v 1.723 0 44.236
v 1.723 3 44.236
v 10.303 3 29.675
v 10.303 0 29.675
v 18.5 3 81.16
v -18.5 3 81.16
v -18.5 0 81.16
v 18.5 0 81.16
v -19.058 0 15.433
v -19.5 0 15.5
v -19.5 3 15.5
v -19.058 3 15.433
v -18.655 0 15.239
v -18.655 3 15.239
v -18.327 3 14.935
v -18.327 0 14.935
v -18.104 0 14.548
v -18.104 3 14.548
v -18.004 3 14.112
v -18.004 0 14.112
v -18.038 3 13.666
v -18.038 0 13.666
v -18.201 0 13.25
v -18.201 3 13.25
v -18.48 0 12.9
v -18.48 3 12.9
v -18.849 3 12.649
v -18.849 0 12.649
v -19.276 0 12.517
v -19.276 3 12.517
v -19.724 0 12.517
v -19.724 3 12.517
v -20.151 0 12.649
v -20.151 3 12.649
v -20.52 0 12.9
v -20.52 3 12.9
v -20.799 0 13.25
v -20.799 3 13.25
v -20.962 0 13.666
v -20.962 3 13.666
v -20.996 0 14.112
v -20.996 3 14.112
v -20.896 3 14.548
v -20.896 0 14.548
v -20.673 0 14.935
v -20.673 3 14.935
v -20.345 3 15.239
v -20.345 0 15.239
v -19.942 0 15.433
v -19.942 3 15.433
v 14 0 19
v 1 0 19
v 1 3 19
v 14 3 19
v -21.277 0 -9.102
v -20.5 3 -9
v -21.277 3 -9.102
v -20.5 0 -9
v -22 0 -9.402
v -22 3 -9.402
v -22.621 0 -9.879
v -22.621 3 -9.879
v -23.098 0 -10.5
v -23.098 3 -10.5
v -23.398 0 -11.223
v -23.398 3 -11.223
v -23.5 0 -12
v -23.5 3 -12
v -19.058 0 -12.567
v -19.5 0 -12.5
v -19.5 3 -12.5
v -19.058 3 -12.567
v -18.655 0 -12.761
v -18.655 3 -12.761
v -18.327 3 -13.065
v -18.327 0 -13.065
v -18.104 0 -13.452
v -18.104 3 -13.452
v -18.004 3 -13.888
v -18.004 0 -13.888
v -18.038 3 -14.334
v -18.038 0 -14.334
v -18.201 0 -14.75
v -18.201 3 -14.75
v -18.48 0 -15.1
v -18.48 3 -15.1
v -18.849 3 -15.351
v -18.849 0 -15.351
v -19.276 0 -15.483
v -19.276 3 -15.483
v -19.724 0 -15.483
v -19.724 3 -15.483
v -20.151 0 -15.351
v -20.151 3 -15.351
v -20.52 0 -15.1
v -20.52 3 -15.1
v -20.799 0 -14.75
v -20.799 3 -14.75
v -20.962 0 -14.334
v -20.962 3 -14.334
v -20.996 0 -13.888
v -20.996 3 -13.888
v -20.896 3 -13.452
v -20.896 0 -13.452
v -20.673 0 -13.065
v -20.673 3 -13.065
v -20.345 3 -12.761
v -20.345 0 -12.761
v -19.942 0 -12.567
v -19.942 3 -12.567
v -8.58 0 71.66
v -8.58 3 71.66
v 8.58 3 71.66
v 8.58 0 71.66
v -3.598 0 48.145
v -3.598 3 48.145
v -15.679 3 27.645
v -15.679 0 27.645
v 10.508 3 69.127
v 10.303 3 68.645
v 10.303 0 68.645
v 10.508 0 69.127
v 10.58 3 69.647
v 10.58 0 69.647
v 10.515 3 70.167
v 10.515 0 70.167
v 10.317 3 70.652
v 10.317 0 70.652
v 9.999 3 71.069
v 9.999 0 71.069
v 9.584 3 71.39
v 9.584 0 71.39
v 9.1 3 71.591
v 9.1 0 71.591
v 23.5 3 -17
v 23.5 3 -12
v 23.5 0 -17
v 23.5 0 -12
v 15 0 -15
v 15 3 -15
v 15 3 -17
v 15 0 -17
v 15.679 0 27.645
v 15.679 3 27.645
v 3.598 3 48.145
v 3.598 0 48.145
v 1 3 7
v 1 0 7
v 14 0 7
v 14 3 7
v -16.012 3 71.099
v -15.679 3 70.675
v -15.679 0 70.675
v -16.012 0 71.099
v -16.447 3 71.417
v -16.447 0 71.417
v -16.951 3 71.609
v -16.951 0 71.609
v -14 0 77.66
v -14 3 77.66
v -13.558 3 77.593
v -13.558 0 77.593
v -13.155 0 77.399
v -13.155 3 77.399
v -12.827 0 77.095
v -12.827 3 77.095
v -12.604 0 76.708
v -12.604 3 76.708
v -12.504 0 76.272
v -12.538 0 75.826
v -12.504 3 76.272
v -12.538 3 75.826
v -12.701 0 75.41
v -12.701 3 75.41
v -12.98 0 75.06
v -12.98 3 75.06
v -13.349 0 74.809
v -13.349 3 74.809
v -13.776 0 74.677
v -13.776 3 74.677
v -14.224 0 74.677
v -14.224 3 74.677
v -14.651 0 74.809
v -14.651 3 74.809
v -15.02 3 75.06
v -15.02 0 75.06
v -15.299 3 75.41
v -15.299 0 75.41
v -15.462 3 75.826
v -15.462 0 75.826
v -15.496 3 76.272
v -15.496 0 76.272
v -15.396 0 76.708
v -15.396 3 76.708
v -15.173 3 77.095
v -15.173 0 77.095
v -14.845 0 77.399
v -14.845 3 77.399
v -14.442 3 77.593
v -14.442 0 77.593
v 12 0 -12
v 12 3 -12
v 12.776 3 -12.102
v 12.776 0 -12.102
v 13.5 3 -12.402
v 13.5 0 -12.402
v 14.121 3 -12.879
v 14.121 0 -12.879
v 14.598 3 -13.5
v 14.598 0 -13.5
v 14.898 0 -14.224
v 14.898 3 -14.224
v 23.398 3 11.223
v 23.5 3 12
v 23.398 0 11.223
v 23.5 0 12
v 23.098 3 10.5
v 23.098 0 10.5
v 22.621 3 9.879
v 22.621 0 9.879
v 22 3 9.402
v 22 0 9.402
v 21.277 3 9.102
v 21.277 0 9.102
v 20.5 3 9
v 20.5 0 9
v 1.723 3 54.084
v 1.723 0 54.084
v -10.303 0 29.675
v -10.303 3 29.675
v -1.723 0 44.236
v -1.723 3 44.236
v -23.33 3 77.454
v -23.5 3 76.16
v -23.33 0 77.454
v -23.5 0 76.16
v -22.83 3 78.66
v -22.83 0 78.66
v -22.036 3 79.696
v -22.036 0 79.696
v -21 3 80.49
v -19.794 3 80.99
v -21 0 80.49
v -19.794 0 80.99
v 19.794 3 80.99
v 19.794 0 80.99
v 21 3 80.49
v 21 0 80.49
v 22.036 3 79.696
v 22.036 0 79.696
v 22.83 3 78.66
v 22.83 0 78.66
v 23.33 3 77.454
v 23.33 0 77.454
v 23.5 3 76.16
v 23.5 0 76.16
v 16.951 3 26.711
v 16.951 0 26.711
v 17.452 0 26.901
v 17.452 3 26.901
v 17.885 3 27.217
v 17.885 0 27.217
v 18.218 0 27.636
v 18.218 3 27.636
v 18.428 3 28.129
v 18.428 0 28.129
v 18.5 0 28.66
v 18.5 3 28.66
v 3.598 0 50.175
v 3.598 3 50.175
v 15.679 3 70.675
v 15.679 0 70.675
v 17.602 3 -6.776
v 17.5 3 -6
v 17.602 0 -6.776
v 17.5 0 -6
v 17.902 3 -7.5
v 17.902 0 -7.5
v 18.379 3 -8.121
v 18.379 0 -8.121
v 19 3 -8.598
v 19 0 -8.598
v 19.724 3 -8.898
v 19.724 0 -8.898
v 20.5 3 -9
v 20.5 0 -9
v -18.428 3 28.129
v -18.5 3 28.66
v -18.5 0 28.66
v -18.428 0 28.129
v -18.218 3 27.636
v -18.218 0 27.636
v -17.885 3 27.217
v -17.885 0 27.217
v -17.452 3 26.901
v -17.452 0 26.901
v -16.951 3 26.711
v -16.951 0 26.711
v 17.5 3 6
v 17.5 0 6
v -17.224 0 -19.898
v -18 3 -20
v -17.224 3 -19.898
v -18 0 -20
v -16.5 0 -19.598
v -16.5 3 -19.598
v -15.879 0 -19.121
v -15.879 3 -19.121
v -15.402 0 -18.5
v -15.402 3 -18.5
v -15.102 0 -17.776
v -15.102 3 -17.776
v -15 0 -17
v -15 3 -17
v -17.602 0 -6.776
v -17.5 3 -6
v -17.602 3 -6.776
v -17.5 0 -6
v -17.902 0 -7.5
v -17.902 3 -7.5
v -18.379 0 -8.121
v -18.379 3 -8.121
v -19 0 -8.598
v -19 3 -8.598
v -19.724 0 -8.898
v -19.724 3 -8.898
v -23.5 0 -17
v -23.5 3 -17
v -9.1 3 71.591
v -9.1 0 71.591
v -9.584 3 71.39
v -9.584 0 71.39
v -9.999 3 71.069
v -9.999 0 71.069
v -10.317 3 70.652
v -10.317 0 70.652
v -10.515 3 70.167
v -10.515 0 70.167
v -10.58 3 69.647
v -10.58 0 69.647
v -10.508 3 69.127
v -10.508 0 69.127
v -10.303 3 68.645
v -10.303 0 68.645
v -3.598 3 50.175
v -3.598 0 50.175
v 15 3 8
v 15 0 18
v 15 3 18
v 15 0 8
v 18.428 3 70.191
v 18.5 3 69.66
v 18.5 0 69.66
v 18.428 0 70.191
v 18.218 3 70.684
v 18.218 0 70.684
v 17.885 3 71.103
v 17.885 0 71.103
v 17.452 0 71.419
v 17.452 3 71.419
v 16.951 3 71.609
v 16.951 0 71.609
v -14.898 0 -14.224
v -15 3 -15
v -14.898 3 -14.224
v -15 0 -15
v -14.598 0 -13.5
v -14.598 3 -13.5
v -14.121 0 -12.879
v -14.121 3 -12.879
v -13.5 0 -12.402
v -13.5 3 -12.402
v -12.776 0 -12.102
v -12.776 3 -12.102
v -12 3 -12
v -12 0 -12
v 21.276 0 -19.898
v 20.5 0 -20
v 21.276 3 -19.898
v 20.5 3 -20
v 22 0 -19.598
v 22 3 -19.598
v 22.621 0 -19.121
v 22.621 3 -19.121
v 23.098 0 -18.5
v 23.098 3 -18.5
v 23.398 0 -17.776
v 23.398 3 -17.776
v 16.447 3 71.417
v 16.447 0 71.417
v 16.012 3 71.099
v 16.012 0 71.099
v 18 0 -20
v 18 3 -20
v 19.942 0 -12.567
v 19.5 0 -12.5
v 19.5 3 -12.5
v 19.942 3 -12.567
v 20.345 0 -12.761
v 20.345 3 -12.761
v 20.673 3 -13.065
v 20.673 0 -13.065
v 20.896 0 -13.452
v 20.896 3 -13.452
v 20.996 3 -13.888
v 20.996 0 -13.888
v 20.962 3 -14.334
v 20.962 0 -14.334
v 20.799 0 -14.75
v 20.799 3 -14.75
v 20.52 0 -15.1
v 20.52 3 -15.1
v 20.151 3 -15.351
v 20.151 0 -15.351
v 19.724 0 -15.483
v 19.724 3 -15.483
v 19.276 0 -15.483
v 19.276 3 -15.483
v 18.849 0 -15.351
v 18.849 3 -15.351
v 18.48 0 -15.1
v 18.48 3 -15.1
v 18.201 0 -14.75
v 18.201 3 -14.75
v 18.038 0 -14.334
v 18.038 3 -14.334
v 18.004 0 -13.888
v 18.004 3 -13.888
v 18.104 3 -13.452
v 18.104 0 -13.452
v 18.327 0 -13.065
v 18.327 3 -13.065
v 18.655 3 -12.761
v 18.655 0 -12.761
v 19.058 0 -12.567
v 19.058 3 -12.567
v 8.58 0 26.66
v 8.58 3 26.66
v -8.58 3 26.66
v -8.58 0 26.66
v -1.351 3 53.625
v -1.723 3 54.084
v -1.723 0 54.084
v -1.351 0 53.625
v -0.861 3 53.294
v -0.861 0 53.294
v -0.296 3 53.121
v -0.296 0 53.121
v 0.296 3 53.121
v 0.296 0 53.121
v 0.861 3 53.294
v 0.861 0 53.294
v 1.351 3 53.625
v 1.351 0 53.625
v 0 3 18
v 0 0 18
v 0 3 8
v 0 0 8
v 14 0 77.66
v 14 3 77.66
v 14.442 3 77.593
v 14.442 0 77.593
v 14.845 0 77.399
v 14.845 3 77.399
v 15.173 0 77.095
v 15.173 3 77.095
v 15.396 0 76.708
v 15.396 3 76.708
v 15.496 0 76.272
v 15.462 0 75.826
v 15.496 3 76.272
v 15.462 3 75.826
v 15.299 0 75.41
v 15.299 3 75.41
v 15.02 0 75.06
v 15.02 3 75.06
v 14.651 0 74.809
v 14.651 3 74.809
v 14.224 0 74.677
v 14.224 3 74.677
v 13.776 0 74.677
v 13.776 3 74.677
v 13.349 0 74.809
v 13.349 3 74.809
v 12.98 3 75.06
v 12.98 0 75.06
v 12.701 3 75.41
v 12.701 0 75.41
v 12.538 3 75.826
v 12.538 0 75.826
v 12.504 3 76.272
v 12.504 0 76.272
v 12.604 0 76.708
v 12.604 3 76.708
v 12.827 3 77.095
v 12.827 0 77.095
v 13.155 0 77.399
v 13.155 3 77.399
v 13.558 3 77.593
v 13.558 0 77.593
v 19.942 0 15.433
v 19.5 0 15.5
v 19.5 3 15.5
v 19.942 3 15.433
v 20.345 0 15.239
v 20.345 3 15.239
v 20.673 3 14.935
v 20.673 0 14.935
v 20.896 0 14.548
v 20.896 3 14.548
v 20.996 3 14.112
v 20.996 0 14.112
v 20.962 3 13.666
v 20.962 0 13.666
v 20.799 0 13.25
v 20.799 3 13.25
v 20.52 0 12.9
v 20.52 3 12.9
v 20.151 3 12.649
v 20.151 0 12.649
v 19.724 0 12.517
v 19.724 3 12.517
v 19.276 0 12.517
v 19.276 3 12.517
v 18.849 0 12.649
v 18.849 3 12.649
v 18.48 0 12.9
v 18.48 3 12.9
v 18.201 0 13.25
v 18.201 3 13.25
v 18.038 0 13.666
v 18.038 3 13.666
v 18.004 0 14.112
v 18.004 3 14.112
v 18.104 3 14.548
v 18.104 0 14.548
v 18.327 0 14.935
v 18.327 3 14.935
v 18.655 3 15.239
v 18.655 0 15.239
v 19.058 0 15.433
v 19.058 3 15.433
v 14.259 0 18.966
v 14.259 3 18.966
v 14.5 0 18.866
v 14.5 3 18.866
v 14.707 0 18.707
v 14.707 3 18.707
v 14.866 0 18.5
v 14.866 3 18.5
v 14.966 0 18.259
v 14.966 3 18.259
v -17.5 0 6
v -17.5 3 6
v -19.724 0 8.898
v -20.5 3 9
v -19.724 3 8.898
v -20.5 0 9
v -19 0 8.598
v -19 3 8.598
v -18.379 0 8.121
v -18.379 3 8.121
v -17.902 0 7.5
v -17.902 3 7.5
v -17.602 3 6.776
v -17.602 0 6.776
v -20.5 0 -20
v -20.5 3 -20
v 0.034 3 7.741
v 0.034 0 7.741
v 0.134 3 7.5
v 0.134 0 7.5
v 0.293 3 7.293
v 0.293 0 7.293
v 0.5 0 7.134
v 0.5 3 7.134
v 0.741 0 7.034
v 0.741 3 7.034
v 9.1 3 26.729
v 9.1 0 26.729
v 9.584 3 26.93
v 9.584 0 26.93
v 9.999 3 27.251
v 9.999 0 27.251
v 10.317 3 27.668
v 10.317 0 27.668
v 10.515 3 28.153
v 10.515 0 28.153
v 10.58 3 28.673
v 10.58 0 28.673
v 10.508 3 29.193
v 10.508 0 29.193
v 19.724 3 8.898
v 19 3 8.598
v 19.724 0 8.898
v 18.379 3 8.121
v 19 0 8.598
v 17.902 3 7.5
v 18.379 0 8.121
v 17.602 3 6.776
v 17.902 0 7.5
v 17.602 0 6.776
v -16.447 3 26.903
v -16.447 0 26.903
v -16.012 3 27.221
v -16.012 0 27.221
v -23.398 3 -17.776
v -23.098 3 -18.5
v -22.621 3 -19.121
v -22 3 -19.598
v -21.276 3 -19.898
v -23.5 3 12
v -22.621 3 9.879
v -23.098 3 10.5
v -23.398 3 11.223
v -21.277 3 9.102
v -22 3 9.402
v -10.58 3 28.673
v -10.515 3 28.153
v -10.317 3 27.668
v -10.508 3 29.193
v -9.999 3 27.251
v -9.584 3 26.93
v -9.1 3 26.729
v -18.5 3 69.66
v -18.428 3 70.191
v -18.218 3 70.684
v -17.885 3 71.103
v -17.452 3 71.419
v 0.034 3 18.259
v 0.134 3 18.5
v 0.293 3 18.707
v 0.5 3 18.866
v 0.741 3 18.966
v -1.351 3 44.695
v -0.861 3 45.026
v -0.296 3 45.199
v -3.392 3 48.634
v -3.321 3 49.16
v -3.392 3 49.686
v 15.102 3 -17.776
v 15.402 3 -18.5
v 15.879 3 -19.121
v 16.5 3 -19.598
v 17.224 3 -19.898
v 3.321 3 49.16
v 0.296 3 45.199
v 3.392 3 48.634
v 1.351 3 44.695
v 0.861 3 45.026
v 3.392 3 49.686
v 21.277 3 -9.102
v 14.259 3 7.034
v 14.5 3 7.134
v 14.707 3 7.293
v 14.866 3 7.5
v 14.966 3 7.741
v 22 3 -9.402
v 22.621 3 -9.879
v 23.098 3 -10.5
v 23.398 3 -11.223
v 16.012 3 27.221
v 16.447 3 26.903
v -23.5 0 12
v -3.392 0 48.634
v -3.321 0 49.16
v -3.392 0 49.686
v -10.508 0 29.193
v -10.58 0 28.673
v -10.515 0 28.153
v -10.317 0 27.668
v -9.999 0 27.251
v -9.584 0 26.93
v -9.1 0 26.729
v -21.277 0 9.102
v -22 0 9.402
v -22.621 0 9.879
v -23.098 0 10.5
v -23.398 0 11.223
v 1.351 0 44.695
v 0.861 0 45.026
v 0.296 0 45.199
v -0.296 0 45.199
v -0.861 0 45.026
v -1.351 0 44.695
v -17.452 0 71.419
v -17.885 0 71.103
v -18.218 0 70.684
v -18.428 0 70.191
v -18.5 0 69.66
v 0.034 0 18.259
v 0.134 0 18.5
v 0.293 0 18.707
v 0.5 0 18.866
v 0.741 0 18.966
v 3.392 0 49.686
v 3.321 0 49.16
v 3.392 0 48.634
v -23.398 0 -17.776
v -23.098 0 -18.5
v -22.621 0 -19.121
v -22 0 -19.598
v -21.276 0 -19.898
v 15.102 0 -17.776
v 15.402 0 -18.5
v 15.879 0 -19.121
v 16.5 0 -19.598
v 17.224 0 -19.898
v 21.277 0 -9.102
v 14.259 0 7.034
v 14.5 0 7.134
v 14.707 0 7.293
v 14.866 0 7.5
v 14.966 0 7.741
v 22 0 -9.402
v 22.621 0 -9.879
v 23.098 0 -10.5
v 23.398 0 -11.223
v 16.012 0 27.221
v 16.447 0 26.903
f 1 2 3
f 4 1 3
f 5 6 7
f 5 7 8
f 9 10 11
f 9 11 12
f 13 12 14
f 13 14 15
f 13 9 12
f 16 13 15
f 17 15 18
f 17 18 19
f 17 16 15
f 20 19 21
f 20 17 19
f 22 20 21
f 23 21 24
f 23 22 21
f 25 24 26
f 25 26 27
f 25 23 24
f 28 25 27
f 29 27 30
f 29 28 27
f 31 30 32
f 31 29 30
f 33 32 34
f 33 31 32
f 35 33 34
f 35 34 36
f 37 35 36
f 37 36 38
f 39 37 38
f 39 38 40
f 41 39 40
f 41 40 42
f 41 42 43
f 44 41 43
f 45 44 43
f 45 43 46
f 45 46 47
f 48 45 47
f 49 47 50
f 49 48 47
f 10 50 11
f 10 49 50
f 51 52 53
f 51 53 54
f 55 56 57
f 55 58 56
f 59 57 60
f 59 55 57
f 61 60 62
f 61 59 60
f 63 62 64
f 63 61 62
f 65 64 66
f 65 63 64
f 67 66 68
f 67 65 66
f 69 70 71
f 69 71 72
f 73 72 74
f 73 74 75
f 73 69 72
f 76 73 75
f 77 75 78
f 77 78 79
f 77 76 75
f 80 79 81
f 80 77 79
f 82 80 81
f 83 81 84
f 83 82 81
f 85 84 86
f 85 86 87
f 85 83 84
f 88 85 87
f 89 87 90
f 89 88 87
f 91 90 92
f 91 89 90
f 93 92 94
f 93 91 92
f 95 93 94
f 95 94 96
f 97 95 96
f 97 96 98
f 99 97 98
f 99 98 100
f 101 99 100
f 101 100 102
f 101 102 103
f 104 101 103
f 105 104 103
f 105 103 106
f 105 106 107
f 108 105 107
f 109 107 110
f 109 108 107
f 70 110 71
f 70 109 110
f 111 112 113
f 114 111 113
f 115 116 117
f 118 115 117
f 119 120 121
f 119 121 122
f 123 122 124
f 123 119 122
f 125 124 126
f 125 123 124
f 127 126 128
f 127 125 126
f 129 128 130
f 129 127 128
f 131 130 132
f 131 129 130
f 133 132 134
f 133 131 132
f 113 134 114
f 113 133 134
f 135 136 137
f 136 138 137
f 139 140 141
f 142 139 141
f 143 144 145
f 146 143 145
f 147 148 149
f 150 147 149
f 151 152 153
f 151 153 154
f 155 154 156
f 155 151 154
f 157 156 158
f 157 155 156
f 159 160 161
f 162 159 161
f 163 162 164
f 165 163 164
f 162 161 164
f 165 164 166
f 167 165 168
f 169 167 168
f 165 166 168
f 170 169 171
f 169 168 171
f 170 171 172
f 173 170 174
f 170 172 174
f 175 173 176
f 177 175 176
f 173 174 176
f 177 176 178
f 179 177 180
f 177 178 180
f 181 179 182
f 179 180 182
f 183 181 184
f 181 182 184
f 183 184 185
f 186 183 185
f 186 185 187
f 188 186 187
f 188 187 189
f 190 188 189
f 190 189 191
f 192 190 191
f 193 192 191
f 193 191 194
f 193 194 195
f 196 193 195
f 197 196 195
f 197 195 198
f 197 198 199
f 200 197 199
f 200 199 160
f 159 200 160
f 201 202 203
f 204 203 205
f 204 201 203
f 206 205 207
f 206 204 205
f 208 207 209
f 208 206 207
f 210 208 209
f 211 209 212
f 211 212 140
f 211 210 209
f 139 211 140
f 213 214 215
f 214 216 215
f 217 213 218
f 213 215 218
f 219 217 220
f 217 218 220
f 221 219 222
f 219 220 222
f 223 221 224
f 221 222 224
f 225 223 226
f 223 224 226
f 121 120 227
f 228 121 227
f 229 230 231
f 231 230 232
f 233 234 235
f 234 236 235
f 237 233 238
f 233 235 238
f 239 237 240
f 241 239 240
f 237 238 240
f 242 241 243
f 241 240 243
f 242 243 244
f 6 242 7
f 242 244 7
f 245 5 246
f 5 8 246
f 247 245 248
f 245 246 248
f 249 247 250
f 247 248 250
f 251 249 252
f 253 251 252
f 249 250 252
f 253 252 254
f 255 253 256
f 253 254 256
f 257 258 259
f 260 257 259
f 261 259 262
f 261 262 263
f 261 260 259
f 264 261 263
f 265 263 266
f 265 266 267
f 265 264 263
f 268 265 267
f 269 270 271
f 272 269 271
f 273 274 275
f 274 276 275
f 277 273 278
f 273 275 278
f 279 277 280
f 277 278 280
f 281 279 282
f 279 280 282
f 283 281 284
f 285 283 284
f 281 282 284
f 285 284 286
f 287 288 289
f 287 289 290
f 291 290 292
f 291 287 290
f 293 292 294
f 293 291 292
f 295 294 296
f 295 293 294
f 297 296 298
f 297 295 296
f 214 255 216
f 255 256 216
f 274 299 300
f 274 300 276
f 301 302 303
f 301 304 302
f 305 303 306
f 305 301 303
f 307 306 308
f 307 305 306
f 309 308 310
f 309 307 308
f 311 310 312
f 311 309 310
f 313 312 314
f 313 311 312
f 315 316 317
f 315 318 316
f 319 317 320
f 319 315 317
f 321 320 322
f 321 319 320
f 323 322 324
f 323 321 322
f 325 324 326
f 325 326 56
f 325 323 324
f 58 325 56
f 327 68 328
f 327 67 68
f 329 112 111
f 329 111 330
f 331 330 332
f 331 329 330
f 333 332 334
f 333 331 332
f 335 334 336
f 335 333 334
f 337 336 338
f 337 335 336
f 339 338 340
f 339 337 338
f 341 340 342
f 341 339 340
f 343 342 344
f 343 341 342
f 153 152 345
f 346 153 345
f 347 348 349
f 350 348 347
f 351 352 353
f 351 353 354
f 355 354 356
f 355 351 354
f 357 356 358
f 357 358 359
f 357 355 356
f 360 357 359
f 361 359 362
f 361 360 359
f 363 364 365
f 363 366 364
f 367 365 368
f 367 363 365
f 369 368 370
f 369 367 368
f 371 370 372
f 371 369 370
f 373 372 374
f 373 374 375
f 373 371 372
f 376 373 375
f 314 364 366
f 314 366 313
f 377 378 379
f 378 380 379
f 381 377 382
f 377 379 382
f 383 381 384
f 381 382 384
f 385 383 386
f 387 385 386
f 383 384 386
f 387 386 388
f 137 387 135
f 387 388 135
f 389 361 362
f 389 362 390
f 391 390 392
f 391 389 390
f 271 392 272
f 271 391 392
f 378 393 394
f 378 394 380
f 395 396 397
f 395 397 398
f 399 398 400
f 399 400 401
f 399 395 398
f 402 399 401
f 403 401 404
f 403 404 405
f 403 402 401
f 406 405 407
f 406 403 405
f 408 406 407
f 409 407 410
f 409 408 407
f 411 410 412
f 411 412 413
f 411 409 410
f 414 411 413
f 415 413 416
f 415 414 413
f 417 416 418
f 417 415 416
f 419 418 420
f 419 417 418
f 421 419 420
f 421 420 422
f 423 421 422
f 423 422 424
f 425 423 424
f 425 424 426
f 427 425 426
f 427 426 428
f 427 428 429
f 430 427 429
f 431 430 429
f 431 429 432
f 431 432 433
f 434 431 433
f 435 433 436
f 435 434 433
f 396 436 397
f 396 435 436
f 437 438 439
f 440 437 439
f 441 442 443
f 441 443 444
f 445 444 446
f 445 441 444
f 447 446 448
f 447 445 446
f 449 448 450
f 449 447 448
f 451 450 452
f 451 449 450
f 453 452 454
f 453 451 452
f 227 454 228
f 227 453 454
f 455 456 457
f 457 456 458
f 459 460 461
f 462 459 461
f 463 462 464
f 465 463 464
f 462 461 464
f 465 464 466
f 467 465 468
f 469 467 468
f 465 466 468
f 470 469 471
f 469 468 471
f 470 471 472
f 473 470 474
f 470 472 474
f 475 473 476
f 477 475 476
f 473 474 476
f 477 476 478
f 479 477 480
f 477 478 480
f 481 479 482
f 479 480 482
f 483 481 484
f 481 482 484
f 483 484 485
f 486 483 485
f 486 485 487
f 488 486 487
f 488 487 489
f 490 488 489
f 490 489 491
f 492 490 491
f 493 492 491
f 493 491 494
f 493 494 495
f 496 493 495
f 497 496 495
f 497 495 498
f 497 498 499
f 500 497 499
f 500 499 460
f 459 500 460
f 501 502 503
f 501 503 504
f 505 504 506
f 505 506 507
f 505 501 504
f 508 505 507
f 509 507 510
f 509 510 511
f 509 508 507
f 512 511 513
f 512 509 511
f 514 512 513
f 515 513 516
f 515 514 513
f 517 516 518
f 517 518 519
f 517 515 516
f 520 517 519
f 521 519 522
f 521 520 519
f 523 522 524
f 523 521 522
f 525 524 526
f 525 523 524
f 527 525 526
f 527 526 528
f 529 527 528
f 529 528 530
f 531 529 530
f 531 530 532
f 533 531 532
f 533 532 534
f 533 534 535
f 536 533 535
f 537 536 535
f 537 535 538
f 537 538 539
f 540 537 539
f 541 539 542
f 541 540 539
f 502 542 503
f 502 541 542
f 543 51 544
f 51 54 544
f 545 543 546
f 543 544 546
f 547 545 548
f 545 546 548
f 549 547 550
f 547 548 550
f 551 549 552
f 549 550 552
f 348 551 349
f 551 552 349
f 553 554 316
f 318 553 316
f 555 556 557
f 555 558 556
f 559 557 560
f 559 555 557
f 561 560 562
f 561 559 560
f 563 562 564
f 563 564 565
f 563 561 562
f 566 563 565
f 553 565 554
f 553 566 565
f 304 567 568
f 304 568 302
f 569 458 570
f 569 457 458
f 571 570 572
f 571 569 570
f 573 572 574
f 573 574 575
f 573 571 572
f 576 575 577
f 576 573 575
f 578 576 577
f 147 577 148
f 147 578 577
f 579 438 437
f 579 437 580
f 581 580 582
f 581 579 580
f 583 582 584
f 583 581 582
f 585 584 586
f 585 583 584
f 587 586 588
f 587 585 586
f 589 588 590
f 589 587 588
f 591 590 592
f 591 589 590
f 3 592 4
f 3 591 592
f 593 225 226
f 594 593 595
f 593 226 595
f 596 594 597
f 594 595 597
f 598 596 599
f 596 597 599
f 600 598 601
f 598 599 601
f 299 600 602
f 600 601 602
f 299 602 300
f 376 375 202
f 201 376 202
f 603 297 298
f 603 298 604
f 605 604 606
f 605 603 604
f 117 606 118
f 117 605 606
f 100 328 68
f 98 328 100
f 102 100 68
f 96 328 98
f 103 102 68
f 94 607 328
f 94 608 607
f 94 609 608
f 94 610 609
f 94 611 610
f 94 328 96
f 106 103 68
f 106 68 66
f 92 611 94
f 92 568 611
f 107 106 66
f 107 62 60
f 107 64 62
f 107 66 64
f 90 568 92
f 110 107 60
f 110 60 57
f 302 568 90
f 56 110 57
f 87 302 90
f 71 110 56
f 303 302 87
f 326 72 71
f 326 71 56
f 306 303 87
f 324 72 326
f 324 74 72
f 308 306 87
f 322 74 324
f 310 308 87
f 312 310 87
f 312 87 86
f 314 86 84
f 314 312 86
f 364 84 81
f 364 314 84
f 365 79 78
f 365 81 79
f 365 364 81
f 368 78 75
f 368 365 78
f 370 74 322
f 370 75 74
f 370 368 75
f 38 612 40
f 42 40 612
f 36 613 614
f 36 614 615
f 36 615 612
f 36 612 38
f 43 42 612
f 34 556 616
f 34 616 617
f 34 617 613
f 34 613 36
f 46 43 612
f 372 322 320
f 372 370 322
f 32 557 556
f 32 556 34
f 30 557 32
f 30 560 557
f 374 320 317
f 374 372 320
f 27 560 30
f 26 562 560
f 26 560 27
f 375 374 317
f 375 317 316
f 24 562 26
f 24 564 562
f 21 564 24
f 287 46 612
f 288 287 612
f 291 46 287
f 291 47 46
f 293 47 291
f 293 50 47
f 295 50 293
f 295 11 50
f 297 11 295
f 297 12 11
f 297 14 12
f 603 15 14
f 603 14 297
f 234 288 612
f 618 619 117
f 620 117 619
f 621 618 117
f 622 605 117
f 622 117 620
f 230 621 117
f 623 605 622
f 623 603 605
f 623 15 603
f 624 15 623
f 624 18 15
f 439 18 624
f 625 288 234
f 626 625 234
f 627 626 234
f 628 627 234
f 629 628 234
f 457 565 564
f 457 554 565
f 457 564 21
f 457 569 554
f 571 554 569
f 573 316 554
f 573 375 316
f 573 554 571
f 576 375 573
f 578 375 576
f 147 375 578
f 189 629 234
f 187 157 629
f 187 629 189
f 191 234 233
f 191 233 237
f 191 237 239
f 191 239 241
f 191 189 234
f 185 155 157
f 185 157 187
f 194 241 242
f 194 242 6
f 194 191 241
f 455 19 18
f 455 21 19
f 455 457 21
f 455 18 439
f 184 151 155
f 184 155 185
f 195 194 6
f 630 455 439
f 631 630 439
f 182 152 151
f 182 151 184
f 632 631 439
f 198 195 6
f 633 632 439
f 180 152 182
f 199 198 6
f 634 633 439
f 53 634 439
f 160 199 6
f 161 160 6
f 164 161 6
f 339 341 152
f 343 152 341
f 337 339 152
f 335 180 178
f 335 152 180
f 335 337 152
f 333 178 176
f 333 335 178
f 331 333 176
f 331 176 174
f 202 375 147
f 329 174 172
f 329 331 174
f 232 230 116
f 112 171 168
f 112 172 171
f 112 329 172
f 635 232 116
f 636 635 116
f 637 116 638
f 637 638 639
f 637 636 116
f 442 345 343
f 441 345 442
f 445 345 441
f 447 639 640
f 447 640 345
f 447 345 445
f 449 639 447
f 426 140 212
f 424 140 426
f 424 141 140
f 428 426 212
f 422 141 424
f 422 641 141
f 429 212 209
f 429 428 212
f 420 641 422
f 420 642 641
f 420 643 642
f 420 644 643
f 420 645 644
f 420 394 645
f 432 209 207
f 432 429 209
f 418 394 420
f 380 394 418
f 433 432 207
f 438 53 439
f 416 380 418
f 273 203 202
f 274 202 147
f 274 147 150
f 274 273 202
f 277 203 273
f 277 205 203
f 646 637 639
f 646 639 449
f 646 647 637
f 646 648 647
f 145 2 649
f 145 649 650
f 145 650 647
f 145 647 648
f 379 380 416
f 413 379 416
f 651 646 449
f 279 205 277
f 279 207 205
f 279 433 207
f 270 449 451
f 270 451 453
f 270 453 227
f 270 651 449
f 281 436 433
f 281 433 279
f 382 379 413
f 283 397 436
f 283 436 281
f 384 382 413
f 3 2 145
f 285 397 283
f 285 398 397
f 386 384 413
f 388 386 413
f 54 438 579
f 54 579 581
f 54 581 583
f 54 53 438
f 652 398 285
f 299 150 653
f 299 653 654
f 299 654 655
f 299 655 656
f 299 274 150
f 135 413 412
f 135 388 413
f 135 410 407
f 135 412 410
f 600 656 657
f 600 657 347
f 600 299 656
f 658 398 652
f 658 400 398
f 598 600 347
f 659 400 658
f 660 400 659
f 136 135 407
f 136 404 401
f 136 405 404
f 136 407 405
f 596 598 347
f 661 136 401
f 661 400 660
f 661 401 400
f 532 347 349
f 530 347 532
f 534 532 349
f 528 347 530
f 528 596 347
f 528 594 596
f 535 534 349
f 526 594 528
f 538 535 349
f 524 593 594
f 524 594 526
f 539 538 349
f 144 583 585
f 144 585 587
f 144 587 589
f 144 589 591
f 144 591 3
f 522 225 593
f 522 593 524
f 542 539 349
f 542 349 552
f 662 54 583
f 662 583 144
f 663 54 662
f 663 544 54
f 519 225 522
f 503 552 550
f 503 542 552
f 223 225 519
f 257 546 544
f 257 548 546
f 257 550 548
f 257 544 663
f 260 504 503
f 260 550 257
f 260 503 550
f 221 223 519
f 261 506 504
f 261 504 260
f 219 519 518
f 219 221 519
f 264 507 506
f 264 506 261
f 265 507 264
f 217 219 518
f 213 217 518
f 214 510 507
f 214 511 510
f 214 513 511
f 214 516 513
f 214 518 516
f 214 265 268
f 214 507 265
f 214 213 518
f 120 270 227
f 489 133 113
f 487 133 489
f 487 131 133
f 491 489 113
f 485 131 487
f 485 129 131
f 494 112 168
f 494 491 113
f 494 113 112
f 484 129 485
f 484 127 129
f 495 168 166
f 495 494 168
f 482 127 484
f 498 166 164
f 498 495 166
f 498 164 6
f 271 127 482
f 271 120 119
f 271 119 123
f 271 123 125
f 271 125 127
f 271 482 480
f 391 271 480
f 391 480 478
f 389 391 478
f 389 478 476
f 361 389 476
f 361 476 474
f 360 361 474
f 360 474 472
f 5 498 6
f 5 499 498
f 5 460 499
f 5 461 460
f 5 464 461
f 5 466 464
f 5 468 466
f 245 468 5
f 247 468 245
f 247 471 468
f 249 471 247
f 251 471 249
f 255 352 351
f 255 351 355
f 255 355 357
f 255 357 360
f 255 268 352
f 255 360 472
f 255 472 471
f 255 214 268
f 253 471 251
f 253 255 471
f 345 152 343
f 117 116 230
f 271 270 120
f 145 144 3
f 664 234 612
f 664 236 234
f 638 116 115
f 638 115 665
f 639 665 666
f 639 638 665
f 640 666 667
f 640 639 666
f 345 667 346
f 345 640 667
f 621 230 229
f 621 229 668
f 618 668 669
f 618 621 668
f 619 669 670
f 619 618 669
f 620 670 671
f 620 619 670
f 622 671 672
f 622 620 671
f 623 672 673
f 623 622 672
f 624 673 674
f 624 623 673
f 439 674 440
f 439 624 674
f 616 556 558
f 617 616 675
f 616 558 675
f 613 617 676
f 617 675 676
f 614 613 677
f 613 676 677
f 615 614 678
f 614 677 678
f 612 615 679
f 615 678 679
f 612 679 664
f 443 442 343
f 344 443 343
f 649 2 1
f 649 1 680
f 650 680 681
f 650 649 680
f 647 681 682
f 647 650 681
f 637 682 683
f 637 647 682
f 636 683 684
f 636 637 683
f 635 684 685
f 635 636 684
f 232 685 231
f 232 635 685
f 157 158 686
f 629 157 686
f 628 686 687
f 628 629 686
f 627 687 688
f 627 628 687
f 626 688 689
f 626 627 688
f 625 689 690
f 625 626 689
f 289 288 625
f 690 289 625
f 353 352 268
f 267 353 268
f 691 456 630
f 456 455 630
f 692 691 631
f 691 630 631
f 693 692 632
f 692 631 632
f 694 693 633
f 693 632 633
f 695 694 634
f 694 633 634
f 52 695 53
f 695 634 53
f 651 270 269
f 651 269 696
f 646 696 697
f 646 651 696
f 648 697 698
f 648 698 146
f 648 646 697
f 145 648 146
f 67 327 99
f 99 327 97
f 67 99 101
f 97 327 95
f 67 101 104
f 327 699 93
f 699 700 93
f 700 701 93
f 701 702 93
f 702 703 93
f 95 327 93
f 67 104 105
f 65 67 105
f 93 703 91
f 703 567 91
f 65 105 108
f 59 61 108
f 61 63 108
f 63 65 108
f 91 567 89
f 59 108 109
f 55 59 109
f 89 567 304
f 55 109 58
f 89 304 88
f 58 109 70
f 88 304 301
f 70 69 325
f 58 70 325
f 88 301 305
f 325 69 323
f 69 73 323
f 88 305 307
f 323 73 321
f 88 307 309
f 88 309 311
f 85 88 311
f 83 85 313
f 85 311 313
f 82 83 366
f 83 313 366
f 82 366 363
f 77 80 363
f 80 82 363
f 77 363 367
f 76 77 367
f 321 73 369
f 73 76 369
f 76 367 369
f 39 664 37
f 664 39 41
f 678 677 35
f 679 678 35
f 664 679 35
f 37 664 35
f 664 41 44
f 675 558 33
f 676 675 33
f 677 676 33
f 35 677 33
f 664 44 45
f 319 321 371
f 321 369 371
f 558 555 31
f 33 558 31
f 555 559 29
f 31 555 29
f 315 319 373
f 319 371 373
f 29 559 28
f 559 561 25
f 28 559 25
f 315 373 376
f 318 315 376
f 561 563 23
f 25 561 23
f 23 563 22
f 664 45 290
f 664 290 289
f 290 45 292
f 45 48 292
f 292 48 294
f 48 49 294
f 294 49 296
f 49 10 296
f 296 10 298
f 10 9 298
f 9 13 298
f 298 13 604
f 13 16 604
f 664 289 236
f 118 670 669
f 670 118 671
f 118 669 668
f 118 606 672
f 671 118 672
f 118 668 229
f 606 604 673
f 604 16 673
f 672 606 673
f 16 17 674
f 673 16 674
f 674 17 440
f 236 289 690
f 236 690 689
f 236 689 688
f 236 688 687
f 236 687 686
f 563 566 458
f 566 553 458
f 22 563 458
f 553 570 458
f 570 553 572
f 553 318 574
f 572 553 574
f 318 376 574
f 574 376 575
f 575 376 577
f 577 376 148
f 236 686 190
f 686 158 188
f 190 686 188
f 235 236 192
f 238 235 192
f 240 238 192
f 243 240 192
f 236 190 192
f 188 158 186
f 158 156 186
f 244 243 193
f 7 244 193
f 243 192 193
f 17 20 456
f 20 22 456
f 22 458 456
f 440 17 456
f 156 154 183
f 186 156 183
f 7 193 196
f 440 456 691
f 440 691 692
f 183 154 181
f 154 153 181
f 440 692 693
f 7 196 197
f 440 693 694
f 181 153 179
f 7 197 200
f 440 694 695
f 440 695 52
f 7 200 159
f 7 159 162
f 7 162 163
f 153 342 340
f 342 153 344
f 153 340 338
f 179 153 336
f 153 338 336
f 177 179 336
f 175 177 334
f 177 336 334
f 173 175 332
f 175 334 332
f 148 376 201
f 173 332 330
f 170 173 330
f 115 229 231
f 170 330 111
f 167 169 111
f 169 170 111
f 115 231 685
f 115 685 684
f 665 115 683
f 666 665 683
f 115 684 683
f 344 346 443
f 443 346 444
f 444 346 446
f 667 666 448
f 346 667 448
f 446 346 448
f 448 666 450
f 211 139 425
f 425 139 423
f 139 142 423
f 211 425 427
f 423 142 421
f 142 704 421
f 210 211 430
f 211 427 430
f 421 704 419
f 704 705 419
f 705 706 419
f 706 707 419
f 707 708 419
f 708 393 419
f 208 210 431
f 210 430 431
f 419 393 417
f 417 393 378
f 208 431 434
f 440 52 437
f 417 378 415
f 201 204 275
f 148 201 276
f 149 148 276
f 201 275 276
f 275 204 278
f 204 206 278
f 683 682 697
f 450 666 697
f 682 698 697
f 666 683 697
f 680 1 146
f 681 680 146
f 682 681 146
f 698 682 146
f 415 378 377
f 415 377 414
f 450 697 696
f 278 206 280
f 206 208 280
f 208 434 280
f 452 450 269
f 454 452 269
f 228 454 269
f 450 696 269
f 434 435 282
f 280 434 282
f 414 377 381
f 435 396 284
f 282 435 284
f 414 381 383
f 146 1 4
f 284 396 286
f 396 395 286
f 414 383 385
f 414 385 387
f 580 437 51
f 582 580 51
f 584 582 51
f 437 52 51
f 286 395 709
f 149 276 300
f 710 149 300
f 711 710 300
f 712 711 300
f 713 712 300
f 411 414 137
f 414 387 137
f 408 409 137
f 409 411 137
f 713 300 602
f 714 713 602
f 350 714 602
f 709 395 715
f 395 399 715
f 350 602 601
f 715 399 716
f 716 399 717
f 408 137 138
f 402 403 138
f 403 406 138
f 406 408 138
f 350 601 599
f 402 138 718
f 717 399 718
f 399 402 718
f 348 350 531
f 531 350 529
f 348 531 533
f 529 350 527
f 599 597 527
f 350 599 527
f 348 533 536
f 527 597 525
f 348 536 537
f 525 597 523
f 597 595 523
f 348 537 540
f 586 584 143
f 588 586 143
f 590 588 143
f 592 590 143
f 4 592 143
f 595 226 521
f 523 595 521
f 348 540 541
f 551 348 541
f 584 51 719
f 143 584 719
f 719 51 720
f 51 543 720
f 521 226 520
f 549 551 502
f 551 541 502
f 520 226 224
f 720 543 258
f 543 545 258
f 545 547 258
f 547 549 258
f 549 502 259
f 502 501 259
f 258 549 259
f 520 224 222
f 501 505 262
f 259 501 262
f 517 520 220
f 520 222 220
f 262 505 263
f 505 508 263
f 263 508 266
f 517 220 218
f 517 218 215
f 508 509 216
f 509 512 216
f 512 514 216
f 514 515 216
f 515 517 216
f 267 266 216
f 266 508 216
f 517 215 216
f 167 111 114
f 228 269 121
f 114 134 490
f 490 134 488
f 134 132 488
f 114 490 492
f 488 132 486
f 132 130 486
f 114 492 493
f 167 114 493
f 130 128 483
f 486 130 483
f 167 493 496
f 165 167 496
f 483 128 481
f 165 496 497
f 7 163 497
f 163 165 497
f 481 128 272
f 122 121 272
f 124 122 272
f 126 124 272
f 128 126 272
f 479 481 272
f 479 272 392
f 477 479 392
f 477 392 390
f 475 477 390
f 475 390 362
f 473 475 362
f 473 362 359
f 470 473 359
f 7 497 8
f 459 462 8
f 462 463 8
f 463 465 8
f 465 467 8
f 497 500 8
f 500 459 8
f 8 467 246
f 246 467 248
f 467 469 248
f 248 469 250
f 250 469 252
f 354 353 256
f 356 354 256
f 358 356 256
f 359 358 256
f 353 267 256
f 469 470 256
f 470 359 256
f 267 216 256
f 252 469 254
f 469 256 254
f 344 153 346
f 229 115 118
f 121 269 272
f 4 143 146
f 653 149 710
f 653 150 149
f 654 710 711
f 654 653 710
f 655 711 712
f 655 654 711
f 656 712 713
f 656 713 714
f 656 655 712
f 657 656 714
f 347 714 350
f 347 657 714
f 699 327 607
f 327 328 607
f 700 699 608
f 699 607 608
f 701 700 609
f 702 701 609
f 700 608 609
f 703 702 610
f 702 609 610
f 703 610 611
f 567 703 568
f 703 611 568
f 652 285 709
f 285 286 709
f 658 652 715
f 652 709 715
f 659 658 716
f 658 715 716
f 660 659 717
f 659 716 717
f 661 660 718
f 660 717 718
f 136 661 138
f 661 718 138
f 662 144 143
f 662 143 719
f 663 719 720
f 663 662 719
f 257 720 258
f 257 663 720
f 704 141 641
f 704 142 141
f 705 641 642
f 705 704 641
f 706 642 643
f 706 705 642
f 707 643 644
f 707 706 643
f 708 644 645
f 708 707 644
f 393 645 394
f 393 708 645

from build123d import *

# Parameters (mm, degrees)
SKETCH_1_W          = 47
SKETCH_1_H          = 40
SKETCH_1_R          = 1.5
SKETCH_1_W_2        = 30
SKETCH_1_H_2        = 12
SKETCH_1_H_3        = 66.16
SKETCH_1_W_3        = 15
EXTRUDE_1_DEPTH     = 3
SKETCH_4_R          = 1.5
SKETCH_4_W          = 47
SKETCH_4_H          = 5
CUT_EXTRUDE_2_DEPTH = 4
SKETCH_7_W          = 30
SKETCH_7_H          = 8
SKETCH_7_W_2        = 6
SKETCH_7_H_2        = 18
CUT_EXTRUDE_3_DEPTH = 10
FILLET_2_R          = 3
FILLET_3_R          = 1
CUT_EXTRUDE_4_DEPTH = 10
FILLET_4_R          = 2
FILLET_5_R          = 5
FILLET_6_R          = 3
FILLET_7_R          = 3


# Some blends are built 0.0001 mm under size
with BuildPart() as part:
    # 草图1 → 凸台-拉伸1 (new body)
    # profile 1 of 3: a face of its own
    with BuildSketch(Plane(origin=(0, 0, 0), x_dir=(1, 0, 0), z_dir=(0, 1, 0))):
        Rectangle(SKETCH_1_W, SKETCH_1_H)
        with Locations(Location((19.5, -14, 0), (0, 0, 270))):
            Circle(SKETCH_1_R, mode=Mode.SUBTRACT)
        with Locations(Location((19.5, 14, 0), (0, 0, 270))):
            Circle(SKETCH_1_R, mode=Mode.SUBTRACT)
        with Locations(Location((-19.5, -14, 0), (0, 0, 270))):
            Circle(SKETCH_1_R, mode=Mode.SUBTRACT)
        with Locations(Location((-19.5, 14, 0), (0, 0, 270))):
            Circle(SKETCH_1_R, mode=Mode.SUBTRACT)
        with Locations((0, -13)):
            Rectangle(SKETCH_1_W_2, SKETCH_1_H_2, mode=Mode.SUBTRACT)
    # profile 2 of 3: a face of its own
    with BuildSketch(Plane(origin=(0, 0, 0), x_dir=(1, 0, 0), z_dir=(0, 1, 0))):
        with Locations((0, -53.08)):
            Rectangle(SKETCH_1_W, SKETCH_1_H_3)
    # profile 3 of 3: a face of its own
    with BuildSketch(Plane(origin=(0, 0, 0), x_dir=(1, 0, 0), z_dir=(0, 1, 0))):
        with Locations((-7.5, -13)):
            Rectangle(SKETCH_1_W_3, SKETCH_1_H_2)
    extrude(amount=EXTRUDE_1_DEPTH)

    # 草图4 → 切除-拉伸2 (cut)
    with BuildSketch(Plane(origin=(0, 3, 0), x_dir=(1, 0, 0), z_dir=(0, 1, 0))):
        with Locations(Location((-14, -76.16, 0), (0, 0, 270))):
            Circle(SKETCH_4_R)
        with Locations(Location((14, -76.16, 0), (0, 0, 270))):
            Circle(SKETCH_4_R)
        with Locations((0, -83.66)):
            Rectangle(SKETCH_4_W, SKETCH_4_H)
    extrude(amount=-CUT_EXTRUDE_2_DEPTH, mode=Mode.SUBTRACT)

    # 草图7 → 切除-拉伸3 (cut)
    with BuildSketch(Plane(origin=(0, 3, 0), x_dir=(1, 0, 0), z_dir=(0, 1, 0))):
        with Locations((0, 16)):
            Rectangle(SKETCH_7_W, SKETCH_7_H)
        with Locations((20.5, 0)):
            Rectangle(SKETCH_7_W_2, SKETCH_7_H_2)
        with Locations((-20.5, 0)):
            Rectangle(SKETCH_7_W_2, SKETCH_7_H_2)
    extrude(amount=-CUT_EXTRUDE_3_DEPTH, mode=Mode.SUBTRACT)

    # 圆角2
    fillet_2_edges = [part.edges().sort_by_distance(p)[0] for p in [
        (-23.5, 1.5, -20),
        (23.5, 1.5, -20),
    ]]
    fillet(fillet_2_edges, radius=FILLET_2_R)

    # 圆角3
    fillet_3_edges = [part.edges().sort_by_distance(p)[0] for p in [
        (0, 1.5, 19),
        (15, 1.5, 19),
        (15, 1.5, 7),
        (0, 1.5, 7),
    ]]
    fillet(fillet_3_edges, radius=FILLET_3_R)

    # 草图9 → 切除-拉伸4 (cut)
    with BuildSketch(Plane(origin=(0, 3, 0), x_dir=(1, 0, 0), z_dir=(0, 1, 0))):
        Polygon((-3, -49.16), (-16.258928571, -26.66), (-18.5, -26.66), (-18.5, -71.66), (-16.258928571, -71.66), align=None)
        Polygon((0, -47.16), (12.080357143, -26.66), (-12.080357143, -26.66), align=None)
        Polygon((18.5, -26.66), (16.258928571, -26.66), (3, -49.16), (16.258928571, -71.66), (18.5, -71.66), align=None)
        Polygon((-12.080357143, -71.66), (12.080357143, -71.66), (0, -51.16), align=None)
    extrude(amount=-CUT_EXTRUDE_4_DEPTH, mode=Mode.SUBTRACT)

    # 圆角4
    # the kernel refuses this fillet: 2 mm, written as the material it adds along each edge
    with BuildSketch(Plane(origin=(16.258928571, 3, 71.66), x_dir=(-0.5076923076923154, 0, -0.8615384615384569), z_dir=(0, -1, 0)), Plane(origin=(16.258928571, 3, 26.66), x_dir=(1, 0, 0), z_dir=(0, -1, 0)), Plane(origin=(-16.258928571, 3, 71.66), x_dir=(-1, 0, 0), z_dir=(0, -1, 0)), Plane(origin=(-16.258928571, 3, 26.66), x_dir=(0.5076923076923154, 0, 0.8615384615384569), z_dir=(0, -1, 0))) as fillet_4_piece_1:
        with BuildLine():
            CenterArc((FILLET_4_R * 0.571428571429, FILLET_4_R), FILLET_4_R, 210.510237406, 59.489762594)
            Line((-FILLET_4_R * 0.29010989011, FILLET_4_R * 0.492307692308), (0, 0))
            Line((0, 0), (FILLET_4_R * 0.571428571429, 0))
        make_face()
    extrude(amount=3)
    with BuildSketch(Plane(origin=(3, 3, 49.16), x_dir=(0.5076923076923108, 0, -0.8615384615384596), z_dir=(0, -1, 0))) as fillet_4_piece_2:
        with BuildLine():
            CenterArc((FILLET_4_R * 0.589285714286, FILLET_4_R), FILLET_4_R, 208.979525188, 61.020474812)
            Line((-FILLET_4_R * 0.285507185123, FILLET_4_R * 0.51550295858), (0, 0))
            Line((0, 0), (FILLET_4_R * 0.589285714286, 0))
        make_face()
    extrude(amount=3)
    with BuildSketch(Plane(origin=(18.5, 3, 26.66), x_dir=(-1, 0, 0), z_dir=(0, -1, 0))) as fillet_4_piece_3:
        with BuildLine():
            CenterArc((FILLET_4_R, -FILLET_4_R), FILLET_4_R, 90, 90)
            Line((0, -FILLET_4_R), (0, 0))
            Line((0, 0), (FILLET_4_R, 0))
        make_face()
    extrude(amount=3)
    with BuildSketch(Plane(origin=(18.5, 3, 71.66), x_dir=(-1, 0, 0), z_dir=(0, -1, 0)), Plane(origin=(-18.5, 3, 71.66), x_dir=(0, 0, -1), z_dir=(0, -1, 0)), Plane(origin=(-18.5, 3, 26.66), x_dir=(1, 0, 0), z_dir=(0, -1, 0))) as fillet_4_piece_4:
        with BuildLine():
            CenterArc((FILLET_4_R, FILLET_4_R), FILLET_4_R, 180, 90)
            Line((0, FILLET_4_R), (0, 0))
            Line((0, 0), (FILLET_4_R, 0))
        make_face()
    extrude(amount=3)
    with BuildSketch(Plane(origin=(-12.080357143, 3, 26.66), x_dir=(0.5076923076923134, 0, 0.8615384615384581), z_dir=(0, -1, 0)), Plane(origin=(-12.080357143, 3, 71.66), x_dir=(1, 0, 0), z_dir=(0, -1, 0))) as fillet_4_piece_5:
        with BuildLine():
            CenterArc((FILLET_4_R * 1.75, -FILLET_4_R), FILLET_4_R, 90, 120.510237406)
            Line((FILLET_4_R * 0.888461538462, -FILLET_4_R * 1.50769230769), (0, 0))
            Line((0, 0), (FILLET_4_R * 1.75, 0))
        make_face()
    extrude(amount=3)
    with BuildSketch(Plane(origin=(12.080357143, 3, 26.66), x_dir=(-0.5076923076923134, 0, 0.8615384615384581), z_dir=(0, -1, 0)), Plane(origin=(12.080357143, 3, 71.66), x_dir=(-1, 0, 0), z_dir=(0, -1, 0))) as fillet_4_piece_6:
        with BuildLine():
            CenterArc((FILLET_4_R * 1.75, FILLET_4_R), FILLET_4_R, 149.489762594, 120.510237406)
            Line((FILLET_4_R * 0.888461538462, FILLET_4_R * 1.50769230769), (0, 0))
            Line((0, 0), (FILLET_4_R * 1.75, 0))
        make_face()
    extrude(amount=3)
    with BuildSketch(Plane(origin=(0, 3, 47.16), x_dir=(-0.5076923076923119, 0, -0.8615384615384591), z_dir=(0, -1, 0)), Plane(origin=(0, 3, 51.16), x_dir=(0.5076923076923116, 0, 0.8615384615384594), z_dir=(0, -1, 0))) as fillet_4_piece_7:
        with BuildLine():
            CenterArc((FILLET_4_R * 1.69696969697, FILLET_4_R), FILLET_4_R, 151.020474812, 118.979525188)
            Line((FILLET_4_R * 0.822176797561, FILLET_4_R * 1.48449704142), (0, 0))
            Line((0, 0), (FILLET_4_R * 1.69696969697, 0))
        make_face()
    extrude(amount=3)
    with BuildSketch(Plane(origin=(-3, 3, 49.16), x_dir=(-0.507692307692313, 0, -0.8615384615384584), z_dir=(0, -1, 0))) as fillet_4_piece_8:
        with BuildLine():
            CenterArc((FILLET_4_R * 0.589285714286, -FILLET_4_R), FILLET_4_R, 90, 61.020474812)
            Line((-FILLET_4_R * 0.285507185123, -FILLET_4_R * 0.51550295858), (0, 0))
            Line((0, 0), (FILLET_4_R * 0.589285714286, 0))
        make_face()
    extrude(amount=3)

    # 圆角5
    fillet_5_edges = [part.edges().sort_by_distance(p)[0] for p in [
        (-23.5, 1.5, 81.16),
        (23.5, 1.5, 81.16),
    ]]
    fillet(fillet_5_edges, radius=FILLET_5_R)

    # 圆角6
    fillet_6_edges = [part.edges().sort_by_distance(p)[0] for p in [
        (15, 1.5, -20),
        (15, 1.5, -12),
        (-15, 1.5, -12),
        (-15, 1.5, -20),
        (17.5, 1.5, -9),
        (17.5, 1.5, 9),
        (-17.5, 1.5, 9),
        (-17.5, 1.5, -9),
    ]]
    fillet(fillet_6_edges, radius=FILLET_6_R)

    # 圆角7
    fillet_7_edges = [part.edges().sort_by_distance(p)[0] for p in [
        (23.5, 1.5, -9),
        (23.5, 1.5, 9),
        (-23.5, 1.5, 9),
        (-23.5, 1.5, -9),
    ]]
    fillet(fillet_7_edges, radius=FILLET_7_R - 0.0001)  # a hair under: the kernel refuses the full size


solid = part.part
